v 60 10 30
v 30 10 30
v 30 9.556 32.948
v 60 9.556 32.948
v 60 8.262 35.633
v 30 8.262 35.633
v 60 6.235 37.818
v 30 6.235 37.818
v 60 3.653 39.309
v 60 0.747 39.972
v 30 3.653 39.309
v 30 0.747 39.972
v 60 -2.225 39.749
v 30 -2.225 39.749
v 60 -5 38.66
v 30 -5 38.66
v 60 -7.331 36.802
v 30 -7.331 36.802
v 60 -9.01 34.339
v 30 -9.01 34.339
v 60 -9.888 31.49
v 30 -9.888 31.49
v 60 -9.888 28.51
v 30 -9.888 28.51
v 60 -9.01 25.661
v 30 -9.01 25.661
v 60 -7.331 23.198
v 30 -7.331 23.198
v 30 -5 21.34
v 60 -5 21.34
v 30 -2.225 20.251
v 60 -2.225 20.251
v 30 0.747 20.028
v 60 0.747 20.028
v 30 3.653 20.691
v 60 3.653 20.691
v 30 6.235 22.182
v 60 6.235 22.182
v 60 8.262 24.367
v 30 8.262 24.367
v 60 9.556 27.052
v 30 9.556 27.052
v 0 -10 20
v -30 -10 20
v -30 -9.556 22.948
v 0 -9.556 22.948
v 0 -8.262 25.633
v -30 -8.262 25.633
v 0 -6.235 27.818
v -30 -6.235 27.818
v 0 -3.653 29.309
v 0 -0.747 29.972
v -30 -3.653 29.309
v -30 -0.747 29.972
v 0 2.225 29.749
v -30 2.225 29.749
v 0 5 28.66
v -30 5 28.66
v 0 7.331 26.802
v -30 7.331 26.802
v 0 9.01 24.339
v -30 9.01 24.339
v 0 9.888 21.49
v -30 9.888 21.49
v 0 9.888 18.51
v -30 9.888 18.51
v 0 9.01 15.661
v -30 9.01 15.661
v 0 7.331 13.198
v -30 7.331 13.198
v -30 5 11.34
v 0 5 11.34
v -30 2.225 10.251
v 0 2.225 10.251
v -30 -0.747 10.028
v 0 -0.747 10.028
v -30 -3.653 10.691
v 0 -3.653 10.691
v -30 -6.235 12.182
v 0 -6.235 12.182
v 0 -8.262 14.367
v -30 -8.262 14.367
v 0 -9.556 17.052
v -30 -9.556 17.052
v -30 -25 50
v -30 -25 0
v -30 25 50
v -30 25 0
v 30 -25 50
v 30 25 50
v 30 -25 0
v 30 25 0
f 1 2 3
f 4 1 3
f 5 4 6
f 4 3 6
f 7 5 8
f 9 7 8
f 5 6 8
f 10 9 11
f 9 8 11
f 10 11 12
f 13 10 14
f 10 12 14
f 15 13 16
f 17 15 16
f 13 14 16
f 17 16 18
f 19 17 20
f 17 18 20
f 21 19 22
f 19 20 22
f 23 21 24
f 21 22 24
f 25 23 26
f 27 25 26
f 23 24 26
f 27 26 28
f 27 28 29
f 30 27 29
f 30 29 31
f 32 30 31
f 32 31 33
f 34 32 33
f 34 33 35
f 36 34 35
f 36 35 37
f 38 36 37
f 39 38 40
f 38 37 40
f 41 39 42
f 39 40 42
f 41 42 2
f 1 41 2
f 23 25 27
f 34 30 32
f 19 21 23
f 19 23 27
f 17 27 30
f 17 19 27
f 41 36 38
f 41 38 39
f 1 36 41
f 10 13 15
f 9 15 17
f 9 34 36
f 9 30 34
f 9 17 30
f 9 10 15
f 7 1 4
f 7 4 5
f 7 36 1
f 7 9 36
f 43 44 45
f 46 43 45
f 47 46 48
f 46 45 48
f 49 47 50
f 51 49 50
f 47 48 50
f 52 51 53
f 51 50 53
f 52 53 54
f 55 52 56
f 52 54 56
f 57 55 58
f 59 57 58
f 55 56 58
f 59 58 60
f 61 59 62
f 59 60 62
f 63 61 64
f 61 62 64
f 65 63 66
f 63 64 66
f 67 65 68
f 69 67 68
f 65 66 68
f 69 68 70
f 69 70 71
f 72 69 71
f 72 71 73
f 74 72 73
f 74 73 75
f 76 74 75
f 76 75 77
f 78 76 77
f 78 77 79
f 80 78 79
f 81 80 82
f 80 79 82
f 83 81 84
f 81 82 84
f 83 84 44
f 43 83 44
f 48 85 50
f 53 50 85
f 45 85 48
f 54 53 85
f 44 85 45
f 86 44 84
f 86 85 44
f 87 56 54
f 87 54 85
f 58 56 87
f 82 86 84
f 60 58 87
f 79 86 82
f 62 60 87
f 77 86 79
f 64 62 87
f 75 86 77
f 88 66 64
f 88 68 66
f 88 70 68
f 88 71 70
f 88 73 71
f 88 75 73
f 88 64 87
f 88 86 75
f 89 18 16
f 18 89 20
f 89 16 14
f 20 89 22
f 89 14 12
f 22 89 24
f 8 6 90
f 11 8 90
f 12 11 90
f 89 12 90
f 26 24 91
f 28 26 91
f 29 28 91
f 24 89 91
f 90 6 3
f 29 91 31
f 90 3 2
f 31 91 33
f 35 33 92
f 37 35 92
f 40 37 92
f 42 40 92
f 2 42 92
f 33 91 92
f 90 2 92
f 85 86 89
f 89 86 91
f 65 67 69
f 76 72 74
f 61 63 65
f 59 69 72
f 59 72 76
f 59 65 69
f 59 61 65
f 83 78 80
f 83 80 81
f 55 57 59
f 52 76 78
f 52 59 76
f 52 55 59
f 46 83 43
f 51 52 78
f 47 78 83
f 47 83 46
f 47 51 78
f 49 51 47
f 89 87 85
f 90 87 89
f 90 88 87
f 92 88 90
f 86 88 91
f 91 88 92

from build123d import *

# Parameters (mm, degrees)
F0_W     = 60
F0_H     = 50
F1_DEPTH = 50
F2_R     = 10
F3_DEPTH = 30
F4_R     = 10
F5_DEPTH = 30


with BuildPart() as f1:
    # F0 (on Top) → F1 (new body)
    with BuildSketch(Plane.XY):
        Rectangle(F0_W, F0_H)
    extrude(amount=F1_DEPTH)

    # F2 (on face) → F3 (join)
    with BuildSketch(Plane.YZ.offset(30)):
        with Locations((0, 30)):
            Circle(F2_R)
    extrude(amount=F3_DEPTH)

    # F4 (on face) → F5 (cut)
    with BuildSketch(Plane(origin=(-30, 0, 0), x_dir=(0, -1, 0), z_dir=(-1, 0, 0))):
        with Locations((0, 20)):
            Circle(F4_R)
    extrude(amount=-F5_DEPTH, mode=Mode.SUBTRACT)


solid = f1.part
